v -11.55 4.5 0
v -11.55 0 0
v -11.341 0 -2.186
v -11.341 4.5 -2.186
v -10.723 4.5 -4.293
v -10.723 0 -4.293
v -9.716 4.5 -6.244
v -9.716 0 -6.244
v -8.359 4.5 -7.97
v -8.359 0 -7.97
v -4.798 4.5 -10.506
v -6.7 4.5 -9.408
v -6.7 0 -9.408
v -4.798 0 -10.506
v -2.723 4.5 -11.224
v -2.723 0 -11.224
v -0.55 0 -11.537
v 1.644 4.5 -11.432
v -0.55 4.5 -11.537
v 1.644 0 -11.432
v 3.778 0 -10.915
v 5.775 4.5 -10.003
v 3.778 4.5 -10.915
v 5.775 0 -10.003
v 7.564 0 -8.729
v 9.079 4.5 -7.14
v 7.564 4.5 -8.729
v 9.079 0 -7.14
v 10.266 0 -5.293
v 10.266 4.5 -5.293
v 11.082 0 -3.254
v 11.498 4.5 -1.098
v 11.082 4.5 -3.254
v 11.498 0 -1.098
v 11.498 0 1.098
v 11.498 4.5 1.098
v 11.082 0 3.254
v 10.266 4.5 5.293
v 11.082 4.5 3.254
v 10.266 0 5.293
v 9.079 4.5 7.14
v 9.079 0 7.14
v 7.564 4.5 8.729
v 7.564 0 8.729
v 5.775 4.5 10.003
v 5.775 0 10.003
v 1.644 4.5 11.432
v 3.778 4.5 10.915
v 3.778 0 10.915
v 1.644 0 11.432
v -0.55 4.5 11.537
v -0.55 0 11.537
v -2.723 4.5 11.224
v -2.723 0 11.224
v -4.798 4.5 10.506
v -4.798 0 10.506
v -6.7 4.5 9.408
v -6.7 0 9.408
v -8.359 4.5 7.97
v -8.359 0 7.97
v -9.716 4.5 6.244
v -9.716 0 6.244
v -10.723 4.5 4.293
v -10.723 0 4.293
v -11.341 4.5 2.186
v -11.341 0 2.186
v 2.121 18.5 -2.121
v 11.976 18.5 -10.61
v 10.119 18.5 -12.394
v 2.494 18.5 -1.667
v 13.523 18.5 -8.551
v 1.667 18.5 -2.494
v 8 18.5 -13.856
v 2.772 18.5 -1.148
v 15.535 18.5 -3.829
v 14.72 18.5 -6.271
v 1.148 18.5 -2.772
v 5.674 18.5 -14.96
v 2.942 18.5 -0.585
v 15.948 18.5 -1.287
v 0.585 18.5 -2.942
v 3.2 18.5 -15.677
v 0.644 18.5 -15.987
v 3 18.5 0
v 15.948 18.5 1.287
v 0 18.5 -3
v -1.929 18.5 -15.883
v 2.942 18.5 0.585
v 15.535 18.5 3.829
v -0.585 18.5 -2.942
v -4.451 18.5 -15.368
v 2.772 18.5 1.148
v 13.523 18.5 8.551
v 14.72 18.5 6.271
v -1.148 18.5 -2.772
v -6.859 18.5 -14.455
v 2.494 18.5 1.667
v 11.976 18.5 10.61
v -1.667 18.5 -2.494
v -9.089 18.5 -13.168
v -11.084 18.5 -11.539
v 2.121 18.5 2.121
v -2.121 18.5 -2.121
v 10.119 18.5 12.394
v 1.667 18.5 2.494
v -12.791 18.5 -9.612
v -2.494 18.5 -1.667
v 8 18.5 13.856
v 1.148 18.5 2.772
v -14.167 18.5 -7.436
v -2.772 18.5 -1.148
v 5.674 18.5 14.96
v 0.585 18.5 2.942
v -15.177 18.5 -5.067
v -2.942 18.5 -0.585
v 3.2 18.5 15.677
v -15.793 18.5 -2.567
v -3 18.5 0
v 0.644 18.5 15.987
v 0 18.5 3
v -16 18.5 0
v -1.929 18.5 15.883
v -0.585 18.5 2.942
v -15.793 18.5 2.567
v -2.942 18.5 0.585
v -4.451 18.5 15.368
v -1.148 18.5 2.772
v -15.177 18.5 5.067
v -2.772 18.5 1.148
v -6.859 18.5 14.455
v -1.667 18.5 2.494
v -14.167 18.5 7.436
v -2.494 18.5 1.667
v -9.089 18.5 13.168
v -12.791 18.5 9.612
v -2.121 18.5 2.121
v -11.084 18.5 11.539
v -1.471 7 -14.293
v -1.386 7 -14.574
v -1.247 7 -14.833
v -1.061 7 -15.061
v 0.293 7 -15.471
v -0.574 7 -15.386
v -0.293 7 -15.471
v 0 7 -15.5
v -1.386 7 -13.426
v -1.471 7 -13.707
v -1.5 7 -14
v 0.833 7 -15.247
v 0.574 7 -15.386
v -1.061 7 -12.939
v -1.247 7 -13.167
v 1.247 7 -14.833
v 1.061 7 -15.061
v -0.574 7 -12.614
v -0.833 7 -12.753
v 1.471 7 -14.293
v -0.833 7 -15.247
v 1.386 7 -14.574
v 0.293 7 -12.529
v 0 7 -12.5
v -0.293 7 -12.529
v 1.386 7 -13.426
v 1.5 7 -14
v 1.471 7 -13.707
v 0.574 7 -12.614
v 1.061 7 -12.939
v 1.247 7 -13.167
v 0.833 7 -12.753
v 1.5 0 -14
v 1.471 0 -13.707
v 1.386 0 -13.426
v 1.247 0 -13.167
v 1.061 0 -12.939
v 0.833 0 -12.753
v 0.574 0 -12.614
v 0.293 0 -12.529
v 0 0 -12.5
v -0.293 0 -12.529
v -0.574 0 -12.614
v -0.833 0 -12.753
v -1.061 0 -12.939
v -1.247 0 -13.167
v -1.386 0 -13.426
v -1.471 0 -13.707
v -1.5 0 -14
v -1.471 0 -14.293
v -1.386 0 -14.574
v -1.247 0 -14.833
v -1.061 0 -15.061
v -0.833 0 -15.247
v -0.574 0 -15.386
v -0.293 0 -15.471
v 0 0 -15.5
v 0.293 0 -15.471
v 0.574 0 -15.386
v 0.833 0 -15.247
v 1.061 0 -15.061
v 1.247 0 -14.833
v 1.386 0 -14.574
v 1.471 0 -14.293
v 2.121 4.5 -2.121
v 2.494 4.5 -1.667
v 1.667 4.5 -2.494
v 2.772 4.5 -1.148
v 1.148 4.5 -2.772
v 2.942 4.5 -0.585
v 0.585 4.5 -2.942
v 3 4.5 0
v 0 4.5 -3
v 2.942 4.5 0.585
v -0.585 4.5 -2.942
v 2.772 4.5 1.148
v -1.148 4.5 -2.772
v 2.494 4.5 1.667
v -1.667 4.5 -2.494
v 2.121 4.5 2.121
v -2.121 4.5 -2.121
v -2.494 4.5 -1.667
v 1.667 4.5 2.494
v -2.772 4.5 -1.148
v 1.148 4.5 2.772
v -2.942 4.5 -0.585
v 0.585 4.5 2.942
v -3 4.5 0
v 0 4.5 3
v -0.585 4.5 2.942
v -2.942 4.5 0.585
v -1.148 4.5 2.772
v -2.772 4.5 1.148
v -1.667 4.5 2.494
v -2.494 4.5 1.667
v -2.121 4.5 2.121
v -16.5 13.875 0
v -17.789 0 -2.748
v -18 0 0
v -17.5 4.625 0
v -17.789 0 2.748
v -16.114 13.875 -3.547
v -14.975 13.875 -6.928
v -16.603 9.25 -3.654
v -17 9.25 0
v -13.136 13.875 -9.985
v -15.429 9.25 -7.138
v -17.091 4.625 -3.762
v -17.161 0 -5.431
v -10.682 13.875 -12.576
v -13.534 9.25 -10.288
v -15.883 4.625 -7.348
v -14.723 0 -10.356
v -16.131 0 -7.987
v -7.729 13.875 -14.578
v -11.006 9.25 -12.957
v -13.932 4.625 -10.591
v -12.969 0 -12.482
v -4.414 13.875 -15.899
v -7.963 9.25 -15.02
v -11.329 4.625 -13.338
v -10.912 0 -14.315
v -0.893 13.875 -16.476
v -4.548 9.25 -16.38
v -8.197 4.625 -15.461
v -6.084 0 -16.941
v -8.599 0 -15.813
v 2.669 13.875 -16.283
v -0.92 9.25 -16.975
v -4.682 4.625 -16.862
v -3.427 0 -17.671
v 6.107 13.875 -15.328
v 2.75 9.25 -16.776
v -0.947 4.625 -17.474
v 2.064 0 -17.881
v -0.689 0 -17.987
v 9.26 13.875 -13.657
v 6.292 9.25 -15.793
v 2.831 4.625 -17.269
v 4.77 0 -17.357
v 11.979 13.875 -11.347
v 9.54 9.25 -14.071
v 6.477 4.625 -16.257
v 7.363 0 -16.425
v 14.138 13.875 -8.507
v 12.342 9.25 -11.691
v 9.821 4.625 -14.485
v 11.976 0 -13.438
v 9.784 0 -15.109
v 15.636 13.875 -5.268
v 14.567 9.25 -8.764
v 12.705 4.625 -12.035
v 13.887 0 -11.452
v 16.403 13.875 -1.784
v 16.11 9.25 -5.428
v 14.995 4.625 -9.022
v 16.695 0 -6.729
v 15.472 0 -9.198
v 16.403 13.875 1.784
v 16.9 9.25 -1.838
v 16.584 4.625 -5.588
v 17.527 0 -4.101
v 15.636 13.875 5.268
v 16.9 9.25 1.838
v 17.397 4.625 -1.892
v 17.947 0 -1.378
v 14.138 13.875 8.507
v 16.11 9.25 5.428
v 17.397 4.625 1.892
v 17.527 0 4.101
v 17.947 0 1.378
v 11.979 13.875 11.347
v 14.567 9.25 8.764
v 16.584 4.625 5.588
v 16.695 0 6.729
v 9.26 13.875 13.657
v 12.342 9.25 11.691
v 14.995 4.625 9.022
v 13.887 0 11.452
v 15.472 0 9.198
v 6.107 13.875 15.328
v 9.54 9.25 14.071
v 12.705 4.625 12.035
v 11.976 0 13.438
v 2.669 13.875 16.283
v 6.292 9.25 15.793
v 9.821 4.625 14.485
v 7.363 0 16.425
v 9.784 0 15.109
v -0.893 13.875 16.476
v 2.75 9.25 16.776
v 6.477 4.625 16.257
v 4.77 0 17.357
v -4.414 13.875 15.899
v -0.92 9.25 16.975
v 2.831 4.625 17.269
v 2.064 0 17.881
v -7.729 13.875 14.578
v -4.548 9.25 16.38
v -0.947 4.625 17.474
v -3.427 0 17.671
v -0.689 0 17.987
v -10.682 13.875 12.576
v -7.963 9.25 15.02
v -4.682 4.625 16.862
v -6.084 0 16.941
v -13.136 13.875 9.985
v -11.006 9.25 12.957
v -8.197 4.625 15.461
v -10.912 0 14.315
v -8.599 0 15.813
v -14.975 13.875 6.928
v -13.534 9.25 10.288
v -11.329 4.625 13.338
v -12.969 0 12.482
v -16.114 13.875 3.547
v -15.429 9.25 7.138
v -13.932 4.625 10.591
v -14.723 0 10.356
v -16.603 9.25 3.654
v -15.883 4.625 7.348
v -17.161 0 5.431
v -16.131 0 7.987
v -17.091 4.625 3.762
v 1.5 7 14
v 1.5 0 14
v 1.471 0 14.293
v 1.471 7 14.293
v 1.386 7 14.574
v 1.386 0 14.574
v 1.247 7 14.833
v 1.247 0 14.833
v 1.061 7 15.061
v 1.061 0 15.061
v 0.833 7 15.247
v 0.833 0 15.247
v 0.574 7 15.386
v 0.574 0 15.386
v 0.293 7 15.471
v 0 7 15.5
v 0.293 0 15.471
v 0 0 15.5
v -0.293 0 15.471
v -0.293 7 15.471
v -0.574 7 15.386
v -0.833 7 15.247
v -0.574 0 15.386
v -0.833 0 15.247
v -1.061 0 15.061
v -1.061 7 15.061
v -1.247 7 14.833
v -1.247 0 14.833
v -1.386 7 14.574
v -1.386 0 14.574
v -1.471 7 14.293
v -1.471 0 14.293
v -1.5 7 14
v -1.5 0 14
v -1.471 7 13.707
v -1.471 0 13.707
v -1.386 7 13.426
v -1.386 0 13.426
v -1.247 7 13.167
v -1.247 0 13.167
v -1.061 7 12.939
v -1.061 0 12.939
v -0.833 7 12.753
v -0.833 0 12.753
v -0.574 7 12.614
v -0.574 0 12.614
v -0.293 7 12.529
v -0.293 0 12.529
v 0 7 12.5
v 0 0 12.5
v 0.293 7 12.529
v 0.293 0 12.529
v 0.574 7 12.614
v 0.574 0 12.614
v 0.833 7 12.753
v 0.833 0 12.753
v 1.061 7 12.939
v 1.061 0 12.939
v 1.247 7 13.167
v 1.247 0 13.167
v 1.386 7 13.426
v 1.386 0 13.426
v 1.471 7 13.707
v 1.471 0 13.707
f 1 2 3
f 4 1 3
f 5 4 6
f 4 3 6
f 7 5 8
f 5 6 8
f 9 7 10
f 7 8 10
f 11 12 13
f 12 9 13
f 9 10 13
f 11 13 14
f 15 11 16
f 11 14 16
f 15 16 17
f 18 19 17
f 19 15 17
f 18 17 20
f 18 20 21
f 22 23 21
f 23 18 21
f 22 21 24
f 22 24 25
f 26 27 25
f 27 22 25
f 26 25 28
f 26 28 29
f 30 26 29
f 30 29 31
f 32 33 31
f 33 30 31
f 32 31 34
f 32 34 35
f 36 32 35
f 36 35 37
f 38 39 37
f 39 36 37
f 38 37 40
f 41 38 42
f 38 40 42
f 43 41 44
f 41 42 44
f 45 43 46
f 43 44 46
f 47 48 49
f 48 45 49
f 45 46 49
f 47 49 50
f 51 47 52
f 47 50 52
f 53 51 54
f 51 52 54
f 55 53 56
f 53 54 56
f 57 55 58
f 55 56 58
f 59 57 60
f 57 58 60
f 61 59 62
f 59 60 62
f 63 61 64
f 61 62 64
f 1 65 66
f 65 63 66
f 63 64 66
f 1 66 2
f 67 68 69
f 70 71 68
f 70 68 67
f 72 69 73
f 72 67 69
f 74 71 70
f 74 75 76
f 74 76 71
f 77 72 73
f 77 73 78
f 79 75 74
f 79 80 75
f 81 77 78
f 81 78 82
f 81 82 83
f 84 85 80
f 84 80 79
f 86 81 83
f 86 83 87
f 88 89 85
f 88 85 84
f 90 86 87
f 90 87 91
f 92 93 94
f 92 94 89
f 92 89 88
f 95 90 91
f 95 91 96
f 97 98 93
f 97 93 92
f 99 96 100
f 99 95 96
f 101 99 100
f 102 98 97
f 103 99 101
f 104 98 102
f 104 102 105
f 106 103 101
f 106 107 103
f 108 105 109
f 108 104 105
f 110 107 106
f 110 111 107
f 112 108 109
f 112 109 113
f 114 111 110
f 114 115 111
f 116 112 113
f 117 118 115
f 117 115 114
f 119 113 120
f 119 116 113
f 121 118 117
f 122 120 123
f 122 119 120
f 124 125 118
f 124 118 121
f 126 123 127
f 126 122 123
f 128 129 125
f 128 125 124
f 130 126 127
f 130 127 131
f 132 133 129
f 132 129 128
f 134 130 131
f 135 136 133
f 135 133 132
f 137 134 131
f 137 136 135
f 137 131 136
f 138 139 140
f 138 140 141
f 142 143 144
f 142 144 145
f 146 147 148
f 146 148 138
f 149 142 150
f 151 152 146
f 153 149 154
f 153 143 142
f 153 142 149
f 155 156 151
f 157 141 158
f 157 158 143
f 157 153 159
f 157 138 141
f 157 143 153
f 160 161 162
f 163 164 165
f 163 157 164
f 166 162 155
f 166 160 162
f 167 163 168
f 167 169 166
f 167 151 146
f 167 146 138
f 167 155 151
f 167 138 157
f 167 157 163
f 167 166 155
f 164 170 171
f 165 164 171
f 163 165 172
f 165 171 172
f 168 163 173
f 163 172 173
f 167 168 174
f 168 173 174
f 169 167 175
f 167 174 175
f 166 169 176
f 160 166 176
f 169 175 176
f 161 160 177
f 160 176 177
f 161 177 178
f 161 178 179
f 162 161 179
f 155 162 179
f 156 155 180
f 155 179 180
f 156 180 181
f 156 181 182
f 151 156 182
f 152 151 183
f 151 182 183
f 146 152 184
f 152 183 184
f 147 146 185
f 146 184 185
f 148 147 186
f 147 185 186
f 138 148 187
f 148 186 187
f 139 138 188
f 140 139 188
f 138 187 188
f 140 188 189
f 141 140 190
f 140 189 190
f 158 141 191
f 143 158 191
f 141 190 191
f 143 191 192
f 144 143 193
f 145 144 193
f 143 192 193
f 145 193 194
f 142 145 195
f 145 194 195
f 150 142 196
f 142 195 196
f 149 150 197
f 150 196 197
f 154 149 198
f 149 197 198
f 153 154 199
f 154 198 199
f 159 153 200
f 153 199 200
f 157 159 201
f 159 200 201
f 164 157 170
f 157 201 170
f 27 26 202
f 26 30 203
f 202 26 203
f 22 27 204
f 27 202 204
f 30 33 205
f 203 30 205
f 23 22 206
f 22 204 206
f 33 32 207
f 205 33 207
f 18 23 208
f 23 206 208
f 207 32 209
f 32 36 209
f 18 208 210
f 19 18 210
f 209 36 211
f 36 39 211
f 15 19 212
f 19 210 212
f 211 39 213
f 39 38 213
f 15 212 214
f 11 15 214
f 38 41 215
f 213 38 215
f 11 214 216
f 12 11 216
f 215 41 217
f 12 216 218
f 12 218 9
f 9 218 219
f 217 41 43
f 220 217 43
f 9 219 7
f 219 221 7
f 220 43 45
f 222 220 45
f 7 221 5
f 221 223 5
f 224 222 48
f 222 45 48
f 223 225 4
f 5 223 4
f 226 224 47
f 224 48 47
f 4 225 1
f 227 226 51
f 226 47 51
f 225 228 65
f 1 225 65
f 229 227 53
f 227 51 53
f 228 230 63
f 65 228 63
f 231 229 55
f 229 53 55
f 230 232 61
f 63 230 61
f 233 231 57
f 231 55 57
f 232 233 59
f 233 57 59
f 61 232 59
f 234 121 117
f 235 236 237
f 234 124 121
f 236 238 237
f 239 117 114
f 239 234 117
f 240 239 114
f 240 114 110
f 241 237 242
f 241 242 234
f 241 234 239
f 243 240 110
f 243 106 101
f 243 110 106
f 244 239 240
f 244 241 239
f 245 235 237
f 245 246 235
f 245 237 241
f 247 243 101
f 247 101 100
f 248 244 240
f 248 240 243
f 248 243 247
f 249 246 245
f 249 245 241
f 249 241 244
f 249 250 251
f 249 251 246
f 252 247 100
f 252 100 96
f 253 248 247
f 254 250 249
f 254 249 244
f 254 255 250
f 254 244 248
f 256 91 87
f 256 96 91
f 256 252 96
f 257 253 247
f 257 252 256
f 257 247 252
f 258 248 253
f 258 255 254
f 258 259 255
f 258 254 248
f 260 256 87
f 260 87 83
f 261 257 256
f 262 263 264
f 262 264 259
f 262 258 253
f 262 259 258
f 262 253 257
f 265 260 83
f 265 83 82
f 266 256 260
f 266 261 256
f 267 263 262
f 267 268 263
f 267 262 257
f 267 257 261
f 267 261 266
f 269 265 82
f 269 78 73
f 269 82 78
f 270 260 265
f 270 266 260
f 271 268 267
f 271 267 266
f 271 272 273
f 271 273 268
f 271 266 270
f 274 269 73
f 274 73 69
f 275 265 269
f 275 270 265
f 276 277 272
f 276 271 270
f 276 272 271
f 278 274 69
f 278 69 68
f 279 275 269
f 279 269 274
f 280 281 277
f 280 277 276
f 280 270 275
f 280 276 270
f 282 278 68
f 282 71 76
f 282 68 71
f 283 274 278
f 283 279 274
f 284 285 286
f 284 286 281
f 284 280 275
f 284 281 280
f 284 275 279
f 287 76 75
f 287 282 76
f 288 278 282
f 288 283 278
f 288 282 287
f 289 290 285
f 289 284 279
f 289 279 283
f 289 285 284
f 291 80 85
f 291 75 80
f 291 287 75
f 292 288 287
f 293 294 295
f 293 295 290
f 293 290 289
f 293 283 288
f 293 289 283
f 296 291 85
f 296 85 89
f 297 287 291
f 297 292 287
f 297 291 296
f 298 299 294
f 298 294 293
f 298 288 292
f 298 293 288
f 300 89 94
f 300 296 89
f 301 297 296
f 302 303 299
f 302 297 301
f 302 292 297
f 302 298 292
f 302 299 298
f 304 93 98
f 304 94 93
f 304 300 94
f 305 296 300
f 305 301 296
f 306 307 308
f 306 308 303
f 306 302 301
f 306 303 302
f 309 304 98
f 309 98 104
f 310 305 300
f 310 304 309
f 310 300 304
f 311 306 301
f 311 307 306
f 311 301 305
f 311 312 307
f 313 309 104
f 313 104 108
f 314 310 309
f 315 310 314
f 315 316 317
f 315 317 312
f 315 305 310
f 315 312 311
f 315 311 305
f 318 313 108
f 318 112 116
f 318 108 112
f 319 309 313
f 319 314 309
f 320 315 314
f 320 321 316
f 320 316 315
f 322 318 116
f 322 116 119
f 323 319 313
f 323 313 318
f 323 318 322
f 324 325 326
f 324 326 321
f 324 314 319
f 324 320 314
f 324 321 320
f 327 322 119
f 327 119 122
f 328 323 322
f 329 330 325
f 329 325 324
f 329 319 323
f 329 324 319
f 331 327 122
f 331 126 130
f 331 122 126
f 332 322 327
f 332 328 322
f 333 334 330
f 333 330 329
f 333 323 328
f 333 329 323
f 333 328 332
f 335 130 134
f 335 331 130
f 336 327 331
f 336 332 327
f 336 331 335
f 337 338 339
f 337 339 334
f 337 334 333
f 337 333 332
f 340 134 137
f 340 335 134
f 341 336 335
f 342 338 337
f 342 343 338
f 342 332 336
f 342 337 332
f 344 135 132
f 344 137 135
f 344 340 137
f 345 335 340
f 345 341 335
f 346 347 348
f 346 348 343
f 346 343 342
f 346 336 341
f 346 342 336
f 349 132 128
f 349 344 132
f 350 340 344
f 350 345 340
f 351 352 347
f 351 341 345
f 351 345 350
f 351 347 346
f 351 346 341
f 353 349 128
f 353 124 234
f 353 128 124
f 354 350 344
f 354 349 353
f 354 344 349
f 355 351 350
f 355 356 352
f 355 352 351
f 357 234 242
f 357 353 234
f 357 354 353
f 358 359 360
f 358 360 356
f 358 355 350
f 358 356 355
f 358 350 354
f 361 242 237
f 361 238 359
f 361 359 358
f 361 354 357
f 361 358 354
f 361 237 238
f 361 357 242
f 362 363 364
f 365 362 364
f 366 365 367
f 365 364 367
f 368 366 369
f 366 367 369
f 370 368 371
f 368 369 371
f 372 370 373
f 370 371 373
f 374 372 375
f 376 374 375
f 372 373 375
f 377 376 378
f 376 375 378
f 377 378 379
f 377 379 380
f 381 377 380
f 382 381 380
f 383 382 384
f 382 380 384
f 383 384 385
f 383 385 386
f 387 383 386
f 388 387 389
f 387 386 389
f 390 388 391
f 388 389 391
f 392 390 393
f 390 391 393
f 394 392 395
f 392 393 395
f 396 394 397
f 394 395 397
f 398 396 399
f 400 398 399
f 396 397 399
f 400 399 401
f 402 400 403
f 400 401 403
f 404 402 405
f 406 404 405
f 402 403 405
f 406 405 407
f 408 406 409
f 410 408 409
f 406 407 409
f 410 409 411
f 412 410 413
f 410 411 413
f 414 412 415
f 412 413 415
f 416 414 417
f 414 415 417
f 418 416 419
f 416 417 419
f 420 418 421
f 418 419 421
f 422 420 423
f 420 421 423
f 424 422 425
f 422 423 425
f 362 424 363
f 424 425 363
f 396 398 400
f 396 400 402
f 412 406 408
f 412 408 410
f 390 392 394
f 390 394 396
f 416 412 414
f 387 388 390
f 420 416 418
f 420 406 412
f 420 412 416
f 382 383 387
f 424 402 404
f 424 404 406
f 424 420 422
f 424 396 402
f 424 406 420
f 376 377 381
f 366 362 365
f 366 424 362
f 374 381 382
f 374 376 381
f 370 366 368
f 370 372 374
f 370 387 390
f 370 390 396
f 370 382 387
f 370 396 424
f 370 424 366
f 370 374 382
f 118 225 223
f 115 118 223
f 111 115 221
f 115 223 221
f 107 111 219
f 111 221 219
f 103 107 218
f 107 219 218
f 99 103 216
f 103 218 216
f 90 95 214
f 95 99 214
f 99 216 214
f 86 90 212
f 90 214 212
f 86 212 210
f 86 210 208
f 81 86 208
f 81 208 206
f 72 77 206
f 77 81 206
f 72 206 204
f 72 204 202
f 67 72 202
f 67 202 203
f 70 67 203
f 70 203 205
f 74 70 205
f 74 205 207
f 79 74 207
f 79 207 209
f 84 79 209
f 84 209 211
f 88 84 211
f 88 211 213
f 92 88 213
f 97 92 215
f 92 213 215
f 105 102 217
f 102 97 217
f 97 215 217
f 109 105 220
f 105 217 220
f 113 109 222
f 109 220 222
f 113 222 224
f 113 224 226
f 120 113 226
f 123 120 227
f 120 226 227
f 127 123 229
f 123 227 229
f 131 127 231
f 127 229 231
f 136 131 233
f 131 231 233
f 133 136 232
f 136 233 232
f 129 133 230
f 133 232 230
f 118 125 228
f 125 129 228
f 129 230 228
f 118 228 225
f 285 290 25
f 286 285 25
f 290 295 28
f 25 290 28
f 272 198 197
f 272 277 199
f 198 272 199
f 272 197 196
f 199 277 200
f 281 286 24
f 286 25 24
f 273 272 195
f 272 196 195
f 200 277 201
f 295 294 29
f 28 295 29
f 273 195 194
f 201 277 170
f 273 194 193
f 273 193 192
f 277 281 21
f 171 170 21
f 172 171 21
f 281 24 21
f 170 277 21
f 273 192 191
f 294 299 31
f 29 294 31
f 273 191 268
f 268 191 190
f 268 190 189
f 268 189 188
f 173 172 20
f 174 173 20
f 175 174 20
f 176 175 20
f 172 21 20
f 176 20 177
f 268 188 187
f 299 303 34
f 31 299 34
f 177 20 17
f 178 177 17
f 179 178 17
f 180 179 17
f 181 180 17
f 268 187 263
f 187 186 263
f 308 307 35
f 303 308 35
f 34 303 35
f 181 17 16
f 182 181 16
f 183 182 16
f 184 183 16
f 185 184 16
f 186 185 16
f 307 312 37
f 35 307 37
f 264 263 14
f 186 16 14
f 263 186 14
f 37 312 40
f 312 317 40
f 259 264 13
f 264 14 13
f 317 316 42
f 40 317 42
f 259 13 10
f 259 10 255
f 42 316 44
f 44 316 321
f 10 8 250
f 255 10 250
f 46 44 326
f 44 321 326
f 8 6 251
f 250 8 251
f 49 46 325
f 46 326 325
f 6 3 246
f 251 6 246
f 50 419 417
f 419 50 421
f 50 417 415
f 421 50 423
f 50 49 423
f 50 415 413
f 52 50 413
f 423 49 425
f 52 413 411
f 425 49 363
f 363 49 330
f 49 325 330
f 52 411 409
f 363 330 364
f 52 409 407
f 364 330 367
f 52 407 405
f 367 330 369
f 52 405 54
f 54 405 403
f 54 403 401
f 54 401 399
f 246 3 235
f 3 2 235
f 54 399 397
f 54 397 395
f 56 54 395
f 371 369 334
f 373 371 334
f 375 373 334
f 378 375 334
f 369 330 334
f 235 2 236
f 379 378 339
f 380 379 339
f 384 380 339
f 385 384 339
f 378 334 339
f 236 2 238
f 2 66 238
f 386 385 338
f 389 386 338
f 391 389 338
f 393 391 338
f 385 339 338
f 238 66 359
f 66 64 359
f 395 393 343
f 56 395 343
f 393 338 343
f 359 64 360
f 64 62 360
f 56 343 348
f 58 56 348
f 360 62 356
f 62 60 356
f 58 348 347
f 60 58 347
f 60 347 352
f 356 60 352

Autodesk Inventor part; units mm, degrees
ref_plane "YZ Plane" through (0, 0, 0) normal (1, 0, 0) x (0, 1, 0)
ref_plane "XZ Plane" through (0, 0, 0) normal (0, 1, 0) x (-1, 0, 0)
ref_plane "XY Plane" through (0, 0, 0) normal (0, 0, 1) x (1, 0, 0)
sketch "Esquisse1" plane through (0, 0, 0) normal (0, 0, 1) x (1, 0, 0)
  line L0 (-18, 0) -> (-16, 18.5)
  line L1 (-16, 18.5) -> (-3, 18.5)
  line L2 (-3, 18.5) -> (-3, 4.5)
  line L3 (-3, 4.5) -> (-11.55, 4.5)
  line L4 (-11.55, 4.5) -> (-11.55, 0)
  line L5 (-11.55, 0) -> (-18, 0)
  line L6 (0, -3.7) -> (0, 22.2) construction
  line L7 (-21.6, 0) -> (3.6, 0) construction
  point P0 (0, 0)
  dimension "d0" = 4.5
  dimension "d3" = 6
  dimension "d4" = 36
  dimension "d5" = 23.1
  dimension "d6" = 32
  dimension "d8" = 18.5
revolve "Révolution1" add sketch "Esquisse1" angle 360 about axis through (0, -10, 0) along (0, 1, 0)
sketch "Esquisse2" plane through (0, 0, 0) normal (0, -1, 0) x (1, 0, 0)
  circle A0 centre (0, 0) radius 14 construction
  circle A1 centre (0, -14) radius 1.5
  line L0 (0, -25.2) -> (0, 25.2) construction
  circle A2 centre (0, 14) radius 1.5
  dimension "d10" = 28
  dimension "d11" = 3
  dimension "d14" = 3
extrude "Extrusion1" cut sketch "Esquisse2" against normal blind 7
properties part number "bouton"
